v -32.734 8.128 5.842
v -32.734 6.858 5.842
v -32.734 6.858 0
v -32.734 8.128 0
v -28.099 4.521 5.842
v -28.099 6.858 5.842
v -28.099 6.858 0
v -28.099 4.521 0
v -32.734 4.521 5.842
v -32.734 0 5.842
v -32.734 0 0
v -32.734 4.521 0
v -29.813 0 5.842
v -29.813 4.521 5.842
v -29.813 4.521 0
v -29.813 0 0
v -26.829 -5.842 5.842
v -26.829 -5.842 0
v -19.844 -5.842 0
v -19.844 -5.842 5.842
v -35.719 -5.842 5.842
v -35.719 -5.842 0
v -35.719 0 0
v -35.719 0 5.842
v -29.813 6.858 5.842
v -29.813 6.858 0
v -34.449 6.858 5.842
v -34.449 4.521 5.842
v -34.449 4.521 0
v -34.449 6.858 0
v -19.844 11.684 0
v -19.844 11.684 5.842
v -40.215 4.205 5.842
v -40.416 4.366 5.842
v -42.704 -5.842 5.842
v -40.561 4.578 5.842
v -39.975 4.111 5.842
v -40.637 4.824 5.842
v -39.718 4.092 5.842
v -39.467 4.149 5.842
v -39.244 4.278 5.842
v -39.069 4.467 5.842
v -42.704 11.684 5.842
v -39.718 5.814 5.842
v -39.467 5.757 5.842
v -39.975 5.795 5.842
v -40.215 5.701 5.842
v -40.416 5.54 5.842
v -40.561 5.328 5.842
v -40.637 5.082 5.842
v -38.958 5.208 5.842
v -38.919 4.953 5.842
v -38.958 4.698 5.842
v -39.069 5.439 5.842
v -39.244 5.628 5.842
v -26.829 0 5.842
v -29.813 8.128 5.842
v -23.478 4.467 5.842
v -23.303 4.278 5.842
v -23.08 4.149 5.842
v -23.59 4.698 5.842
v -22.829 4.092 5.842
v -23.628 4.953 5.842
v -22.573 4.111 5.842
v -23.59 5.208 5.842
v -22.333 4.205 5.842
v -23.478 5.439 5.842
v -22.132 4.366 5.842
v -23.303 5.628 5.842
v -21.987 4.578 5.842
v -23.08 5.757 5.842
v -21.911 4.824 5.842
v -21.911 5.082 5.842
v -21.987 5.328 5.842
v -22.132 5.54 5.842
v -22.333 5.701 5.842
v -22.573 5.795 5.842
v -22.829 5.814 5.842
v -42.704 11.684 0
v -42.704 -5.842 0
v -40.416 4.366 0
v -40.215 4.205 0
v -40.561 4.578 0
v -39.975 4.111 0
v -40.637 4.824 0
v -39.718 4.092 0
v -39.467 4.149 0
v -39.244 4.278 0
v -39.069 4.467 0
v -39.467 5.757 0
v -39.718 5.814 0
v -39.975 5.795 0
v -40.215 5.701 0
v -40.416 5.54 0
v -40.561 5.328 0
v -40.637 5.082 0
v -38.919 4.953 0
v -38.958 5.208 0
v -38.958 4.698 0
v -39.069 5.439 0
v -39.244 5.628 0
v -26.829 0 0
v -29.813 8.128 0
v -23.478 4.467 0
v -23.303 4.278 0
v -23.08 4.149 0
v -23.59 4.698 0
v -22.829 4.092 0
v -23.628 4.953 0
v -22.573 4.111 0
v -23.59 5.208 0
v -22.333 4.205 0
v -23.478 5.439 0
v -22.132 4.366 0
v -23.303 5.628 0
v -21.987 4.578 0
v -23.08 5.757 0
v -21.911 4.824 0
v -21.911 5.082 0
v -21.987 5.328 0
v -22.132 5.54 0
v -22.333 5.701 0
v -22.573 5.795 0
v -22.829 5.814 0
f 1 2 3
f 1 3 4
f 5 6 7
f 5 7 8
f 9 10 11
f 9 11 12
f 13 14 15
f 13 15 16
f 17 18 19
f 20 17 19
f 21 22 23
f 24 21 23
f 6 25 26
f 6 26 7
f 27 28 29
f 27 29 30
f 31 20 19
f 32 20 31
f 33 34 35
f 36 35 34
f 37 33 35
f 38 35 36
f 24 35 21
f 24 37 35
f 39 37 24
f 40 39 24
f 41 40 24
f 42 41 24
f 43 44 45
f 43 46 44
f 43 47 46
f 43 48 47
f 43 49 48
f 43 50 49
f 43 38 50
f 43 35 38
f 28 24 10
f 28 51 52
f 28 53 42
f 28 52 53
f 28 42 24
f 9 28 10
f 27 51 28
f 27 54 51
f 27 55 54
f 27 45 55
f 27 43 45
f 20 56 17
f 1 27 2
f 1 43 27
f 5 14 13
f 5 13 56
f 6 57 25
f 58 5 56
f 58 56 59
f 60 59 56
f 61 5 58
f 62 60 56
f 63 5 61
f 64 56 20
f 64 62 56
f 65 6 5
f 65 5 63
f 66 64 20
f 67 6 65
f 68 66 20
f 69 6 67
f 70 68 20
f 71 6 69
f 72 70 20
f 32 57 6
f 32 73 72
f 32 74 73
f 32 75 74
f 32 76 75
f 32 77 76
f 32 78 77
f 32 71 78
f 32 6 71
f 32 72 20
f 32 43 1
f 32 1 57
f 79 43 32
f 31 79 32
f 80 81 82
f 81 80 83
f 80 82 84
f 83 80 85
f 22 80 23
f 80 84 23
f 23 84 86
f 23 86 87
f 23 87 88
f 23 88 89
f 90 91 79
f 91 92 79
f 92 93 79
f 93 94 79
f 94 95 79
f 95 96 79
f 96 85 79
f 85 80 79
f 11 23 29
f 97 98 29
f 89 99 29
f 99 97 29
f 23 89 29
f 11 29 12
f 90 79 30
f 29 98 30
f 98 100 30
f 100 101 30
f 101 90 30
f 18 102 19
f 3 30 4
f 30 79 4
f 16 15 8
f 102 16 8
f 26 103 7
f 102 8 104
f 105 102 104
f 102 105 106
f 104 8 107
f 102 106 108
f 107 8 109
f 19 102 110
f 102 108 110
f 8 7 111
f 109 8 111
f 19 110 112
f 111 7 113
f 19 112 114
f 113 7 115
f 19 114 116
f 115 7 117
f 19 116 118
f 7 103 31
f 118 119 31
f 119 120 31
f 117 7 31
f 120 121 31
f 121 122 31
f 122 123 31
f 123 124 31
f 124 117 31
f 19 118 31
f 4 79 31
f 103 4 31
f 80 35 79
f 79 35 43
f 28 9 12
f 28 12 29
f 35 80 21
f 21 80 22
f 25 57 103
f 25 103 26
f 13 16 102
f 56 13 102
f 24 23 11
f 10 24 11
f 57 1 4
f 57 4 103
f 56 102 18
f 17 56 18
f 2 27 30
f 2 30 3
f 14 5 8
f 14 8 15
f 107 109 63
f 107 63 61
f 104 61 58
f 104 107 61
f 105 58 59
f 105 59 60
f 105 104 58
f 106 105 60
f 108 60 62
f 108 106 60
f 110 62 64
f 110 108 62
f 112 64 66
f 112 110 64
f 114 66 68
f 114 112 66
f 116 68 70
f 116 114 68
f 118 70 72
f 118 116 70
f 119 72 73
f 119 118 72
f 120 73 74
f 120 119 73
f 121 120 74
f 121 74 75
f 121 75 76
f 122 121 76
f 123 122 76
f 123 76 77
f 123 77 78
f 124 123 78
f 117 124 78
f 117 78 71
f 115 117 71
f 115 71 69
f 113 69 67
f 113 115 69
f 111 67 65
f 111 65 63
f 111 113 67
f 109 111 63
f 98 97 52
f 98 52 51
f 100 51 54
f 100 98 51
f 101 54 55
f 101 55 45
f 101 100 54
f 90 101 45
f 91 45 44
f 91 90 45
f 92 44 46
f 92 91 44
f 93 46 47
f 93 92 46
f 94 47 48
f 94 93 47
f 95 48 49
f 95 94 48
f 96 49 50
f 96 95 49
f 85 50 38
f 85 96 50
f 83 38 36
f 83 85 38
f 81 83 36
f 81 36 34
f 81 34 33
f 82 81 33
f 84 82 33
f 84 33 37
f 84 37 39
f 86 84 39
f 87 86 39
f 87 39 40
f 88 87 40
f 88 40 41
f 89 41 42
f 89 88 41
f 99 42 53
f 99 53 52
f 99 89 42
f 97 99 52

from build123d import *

# Parameters (mm, degrees)
SKETCH2_R           = 0.8636
BOSS_EXTRUDE1_DEPTH = 5.842
SKETCH4_W           = 22.86
SKETCH4_H           = 3.81
BOSS_EXTRUDE2_DEPTH = 5.842
CUT_EXTRUDE1_DEPTH  = 45.657083246


with BuildPart() as part:
    # Sketch2 → Boss-Extrude1 (new body)
    with BuildSketch(Plane.XY):
        Polygon((-42.70375, -5.842), (-35.71875, -5.842), (-35.71875, 0), (-26.82875, 0), (-26.82875, -5.842), (-19.84375, -5.842), (-19.84375, 7.874), (-42.70375, 7.874), align=None)
        with Locations((-39.78275, 4.953)):
            Circle(SKETCH2_R, mode=Mode.SUBTRACT)
        with Locations(Location((-22.76475, 4.953, 0), (0, 0, 180))):
            Circle(SKETCH2_R, mode=Mode.SUBTRACT)
    extrude(amount=BOSS_EXTRUDE1_DEPTH)

    # Sketch4 → Boss-Extrude2 (add)
    with BuildSketch(Plane.XY.offset(5.842)):
        with Locations((-31.27375, 9.779)):
            Rectangle(SKETCH4_W, SKETCH4_H)
    extrude(amount=-BOSS_EXTRUDE2_DEPTH)

    # Sketch3 → Cut-Extrude1 (cut, through all)
    with BuildSketch(Plane.XY.offset(5.842)):
        Polygon((-32.73425, 0), (-32.73425, 4.5212), (-34.44875, 4.5212), (-34.44875, 6.858), (-32.73425, 6.858), (-32.73425, 8.128), (-29.81325, 8.128), (-29.81325, 6.858), (-28.09875, 6.858), (-28.09875, 4.5212), (-29.81325, 4.5212), (-29.81325, 0), align=None)
    extrude(amount=-CUT_EXTRUDE1_DEPTH, mode=Mode.SUBTRACT)


solid = part.part
